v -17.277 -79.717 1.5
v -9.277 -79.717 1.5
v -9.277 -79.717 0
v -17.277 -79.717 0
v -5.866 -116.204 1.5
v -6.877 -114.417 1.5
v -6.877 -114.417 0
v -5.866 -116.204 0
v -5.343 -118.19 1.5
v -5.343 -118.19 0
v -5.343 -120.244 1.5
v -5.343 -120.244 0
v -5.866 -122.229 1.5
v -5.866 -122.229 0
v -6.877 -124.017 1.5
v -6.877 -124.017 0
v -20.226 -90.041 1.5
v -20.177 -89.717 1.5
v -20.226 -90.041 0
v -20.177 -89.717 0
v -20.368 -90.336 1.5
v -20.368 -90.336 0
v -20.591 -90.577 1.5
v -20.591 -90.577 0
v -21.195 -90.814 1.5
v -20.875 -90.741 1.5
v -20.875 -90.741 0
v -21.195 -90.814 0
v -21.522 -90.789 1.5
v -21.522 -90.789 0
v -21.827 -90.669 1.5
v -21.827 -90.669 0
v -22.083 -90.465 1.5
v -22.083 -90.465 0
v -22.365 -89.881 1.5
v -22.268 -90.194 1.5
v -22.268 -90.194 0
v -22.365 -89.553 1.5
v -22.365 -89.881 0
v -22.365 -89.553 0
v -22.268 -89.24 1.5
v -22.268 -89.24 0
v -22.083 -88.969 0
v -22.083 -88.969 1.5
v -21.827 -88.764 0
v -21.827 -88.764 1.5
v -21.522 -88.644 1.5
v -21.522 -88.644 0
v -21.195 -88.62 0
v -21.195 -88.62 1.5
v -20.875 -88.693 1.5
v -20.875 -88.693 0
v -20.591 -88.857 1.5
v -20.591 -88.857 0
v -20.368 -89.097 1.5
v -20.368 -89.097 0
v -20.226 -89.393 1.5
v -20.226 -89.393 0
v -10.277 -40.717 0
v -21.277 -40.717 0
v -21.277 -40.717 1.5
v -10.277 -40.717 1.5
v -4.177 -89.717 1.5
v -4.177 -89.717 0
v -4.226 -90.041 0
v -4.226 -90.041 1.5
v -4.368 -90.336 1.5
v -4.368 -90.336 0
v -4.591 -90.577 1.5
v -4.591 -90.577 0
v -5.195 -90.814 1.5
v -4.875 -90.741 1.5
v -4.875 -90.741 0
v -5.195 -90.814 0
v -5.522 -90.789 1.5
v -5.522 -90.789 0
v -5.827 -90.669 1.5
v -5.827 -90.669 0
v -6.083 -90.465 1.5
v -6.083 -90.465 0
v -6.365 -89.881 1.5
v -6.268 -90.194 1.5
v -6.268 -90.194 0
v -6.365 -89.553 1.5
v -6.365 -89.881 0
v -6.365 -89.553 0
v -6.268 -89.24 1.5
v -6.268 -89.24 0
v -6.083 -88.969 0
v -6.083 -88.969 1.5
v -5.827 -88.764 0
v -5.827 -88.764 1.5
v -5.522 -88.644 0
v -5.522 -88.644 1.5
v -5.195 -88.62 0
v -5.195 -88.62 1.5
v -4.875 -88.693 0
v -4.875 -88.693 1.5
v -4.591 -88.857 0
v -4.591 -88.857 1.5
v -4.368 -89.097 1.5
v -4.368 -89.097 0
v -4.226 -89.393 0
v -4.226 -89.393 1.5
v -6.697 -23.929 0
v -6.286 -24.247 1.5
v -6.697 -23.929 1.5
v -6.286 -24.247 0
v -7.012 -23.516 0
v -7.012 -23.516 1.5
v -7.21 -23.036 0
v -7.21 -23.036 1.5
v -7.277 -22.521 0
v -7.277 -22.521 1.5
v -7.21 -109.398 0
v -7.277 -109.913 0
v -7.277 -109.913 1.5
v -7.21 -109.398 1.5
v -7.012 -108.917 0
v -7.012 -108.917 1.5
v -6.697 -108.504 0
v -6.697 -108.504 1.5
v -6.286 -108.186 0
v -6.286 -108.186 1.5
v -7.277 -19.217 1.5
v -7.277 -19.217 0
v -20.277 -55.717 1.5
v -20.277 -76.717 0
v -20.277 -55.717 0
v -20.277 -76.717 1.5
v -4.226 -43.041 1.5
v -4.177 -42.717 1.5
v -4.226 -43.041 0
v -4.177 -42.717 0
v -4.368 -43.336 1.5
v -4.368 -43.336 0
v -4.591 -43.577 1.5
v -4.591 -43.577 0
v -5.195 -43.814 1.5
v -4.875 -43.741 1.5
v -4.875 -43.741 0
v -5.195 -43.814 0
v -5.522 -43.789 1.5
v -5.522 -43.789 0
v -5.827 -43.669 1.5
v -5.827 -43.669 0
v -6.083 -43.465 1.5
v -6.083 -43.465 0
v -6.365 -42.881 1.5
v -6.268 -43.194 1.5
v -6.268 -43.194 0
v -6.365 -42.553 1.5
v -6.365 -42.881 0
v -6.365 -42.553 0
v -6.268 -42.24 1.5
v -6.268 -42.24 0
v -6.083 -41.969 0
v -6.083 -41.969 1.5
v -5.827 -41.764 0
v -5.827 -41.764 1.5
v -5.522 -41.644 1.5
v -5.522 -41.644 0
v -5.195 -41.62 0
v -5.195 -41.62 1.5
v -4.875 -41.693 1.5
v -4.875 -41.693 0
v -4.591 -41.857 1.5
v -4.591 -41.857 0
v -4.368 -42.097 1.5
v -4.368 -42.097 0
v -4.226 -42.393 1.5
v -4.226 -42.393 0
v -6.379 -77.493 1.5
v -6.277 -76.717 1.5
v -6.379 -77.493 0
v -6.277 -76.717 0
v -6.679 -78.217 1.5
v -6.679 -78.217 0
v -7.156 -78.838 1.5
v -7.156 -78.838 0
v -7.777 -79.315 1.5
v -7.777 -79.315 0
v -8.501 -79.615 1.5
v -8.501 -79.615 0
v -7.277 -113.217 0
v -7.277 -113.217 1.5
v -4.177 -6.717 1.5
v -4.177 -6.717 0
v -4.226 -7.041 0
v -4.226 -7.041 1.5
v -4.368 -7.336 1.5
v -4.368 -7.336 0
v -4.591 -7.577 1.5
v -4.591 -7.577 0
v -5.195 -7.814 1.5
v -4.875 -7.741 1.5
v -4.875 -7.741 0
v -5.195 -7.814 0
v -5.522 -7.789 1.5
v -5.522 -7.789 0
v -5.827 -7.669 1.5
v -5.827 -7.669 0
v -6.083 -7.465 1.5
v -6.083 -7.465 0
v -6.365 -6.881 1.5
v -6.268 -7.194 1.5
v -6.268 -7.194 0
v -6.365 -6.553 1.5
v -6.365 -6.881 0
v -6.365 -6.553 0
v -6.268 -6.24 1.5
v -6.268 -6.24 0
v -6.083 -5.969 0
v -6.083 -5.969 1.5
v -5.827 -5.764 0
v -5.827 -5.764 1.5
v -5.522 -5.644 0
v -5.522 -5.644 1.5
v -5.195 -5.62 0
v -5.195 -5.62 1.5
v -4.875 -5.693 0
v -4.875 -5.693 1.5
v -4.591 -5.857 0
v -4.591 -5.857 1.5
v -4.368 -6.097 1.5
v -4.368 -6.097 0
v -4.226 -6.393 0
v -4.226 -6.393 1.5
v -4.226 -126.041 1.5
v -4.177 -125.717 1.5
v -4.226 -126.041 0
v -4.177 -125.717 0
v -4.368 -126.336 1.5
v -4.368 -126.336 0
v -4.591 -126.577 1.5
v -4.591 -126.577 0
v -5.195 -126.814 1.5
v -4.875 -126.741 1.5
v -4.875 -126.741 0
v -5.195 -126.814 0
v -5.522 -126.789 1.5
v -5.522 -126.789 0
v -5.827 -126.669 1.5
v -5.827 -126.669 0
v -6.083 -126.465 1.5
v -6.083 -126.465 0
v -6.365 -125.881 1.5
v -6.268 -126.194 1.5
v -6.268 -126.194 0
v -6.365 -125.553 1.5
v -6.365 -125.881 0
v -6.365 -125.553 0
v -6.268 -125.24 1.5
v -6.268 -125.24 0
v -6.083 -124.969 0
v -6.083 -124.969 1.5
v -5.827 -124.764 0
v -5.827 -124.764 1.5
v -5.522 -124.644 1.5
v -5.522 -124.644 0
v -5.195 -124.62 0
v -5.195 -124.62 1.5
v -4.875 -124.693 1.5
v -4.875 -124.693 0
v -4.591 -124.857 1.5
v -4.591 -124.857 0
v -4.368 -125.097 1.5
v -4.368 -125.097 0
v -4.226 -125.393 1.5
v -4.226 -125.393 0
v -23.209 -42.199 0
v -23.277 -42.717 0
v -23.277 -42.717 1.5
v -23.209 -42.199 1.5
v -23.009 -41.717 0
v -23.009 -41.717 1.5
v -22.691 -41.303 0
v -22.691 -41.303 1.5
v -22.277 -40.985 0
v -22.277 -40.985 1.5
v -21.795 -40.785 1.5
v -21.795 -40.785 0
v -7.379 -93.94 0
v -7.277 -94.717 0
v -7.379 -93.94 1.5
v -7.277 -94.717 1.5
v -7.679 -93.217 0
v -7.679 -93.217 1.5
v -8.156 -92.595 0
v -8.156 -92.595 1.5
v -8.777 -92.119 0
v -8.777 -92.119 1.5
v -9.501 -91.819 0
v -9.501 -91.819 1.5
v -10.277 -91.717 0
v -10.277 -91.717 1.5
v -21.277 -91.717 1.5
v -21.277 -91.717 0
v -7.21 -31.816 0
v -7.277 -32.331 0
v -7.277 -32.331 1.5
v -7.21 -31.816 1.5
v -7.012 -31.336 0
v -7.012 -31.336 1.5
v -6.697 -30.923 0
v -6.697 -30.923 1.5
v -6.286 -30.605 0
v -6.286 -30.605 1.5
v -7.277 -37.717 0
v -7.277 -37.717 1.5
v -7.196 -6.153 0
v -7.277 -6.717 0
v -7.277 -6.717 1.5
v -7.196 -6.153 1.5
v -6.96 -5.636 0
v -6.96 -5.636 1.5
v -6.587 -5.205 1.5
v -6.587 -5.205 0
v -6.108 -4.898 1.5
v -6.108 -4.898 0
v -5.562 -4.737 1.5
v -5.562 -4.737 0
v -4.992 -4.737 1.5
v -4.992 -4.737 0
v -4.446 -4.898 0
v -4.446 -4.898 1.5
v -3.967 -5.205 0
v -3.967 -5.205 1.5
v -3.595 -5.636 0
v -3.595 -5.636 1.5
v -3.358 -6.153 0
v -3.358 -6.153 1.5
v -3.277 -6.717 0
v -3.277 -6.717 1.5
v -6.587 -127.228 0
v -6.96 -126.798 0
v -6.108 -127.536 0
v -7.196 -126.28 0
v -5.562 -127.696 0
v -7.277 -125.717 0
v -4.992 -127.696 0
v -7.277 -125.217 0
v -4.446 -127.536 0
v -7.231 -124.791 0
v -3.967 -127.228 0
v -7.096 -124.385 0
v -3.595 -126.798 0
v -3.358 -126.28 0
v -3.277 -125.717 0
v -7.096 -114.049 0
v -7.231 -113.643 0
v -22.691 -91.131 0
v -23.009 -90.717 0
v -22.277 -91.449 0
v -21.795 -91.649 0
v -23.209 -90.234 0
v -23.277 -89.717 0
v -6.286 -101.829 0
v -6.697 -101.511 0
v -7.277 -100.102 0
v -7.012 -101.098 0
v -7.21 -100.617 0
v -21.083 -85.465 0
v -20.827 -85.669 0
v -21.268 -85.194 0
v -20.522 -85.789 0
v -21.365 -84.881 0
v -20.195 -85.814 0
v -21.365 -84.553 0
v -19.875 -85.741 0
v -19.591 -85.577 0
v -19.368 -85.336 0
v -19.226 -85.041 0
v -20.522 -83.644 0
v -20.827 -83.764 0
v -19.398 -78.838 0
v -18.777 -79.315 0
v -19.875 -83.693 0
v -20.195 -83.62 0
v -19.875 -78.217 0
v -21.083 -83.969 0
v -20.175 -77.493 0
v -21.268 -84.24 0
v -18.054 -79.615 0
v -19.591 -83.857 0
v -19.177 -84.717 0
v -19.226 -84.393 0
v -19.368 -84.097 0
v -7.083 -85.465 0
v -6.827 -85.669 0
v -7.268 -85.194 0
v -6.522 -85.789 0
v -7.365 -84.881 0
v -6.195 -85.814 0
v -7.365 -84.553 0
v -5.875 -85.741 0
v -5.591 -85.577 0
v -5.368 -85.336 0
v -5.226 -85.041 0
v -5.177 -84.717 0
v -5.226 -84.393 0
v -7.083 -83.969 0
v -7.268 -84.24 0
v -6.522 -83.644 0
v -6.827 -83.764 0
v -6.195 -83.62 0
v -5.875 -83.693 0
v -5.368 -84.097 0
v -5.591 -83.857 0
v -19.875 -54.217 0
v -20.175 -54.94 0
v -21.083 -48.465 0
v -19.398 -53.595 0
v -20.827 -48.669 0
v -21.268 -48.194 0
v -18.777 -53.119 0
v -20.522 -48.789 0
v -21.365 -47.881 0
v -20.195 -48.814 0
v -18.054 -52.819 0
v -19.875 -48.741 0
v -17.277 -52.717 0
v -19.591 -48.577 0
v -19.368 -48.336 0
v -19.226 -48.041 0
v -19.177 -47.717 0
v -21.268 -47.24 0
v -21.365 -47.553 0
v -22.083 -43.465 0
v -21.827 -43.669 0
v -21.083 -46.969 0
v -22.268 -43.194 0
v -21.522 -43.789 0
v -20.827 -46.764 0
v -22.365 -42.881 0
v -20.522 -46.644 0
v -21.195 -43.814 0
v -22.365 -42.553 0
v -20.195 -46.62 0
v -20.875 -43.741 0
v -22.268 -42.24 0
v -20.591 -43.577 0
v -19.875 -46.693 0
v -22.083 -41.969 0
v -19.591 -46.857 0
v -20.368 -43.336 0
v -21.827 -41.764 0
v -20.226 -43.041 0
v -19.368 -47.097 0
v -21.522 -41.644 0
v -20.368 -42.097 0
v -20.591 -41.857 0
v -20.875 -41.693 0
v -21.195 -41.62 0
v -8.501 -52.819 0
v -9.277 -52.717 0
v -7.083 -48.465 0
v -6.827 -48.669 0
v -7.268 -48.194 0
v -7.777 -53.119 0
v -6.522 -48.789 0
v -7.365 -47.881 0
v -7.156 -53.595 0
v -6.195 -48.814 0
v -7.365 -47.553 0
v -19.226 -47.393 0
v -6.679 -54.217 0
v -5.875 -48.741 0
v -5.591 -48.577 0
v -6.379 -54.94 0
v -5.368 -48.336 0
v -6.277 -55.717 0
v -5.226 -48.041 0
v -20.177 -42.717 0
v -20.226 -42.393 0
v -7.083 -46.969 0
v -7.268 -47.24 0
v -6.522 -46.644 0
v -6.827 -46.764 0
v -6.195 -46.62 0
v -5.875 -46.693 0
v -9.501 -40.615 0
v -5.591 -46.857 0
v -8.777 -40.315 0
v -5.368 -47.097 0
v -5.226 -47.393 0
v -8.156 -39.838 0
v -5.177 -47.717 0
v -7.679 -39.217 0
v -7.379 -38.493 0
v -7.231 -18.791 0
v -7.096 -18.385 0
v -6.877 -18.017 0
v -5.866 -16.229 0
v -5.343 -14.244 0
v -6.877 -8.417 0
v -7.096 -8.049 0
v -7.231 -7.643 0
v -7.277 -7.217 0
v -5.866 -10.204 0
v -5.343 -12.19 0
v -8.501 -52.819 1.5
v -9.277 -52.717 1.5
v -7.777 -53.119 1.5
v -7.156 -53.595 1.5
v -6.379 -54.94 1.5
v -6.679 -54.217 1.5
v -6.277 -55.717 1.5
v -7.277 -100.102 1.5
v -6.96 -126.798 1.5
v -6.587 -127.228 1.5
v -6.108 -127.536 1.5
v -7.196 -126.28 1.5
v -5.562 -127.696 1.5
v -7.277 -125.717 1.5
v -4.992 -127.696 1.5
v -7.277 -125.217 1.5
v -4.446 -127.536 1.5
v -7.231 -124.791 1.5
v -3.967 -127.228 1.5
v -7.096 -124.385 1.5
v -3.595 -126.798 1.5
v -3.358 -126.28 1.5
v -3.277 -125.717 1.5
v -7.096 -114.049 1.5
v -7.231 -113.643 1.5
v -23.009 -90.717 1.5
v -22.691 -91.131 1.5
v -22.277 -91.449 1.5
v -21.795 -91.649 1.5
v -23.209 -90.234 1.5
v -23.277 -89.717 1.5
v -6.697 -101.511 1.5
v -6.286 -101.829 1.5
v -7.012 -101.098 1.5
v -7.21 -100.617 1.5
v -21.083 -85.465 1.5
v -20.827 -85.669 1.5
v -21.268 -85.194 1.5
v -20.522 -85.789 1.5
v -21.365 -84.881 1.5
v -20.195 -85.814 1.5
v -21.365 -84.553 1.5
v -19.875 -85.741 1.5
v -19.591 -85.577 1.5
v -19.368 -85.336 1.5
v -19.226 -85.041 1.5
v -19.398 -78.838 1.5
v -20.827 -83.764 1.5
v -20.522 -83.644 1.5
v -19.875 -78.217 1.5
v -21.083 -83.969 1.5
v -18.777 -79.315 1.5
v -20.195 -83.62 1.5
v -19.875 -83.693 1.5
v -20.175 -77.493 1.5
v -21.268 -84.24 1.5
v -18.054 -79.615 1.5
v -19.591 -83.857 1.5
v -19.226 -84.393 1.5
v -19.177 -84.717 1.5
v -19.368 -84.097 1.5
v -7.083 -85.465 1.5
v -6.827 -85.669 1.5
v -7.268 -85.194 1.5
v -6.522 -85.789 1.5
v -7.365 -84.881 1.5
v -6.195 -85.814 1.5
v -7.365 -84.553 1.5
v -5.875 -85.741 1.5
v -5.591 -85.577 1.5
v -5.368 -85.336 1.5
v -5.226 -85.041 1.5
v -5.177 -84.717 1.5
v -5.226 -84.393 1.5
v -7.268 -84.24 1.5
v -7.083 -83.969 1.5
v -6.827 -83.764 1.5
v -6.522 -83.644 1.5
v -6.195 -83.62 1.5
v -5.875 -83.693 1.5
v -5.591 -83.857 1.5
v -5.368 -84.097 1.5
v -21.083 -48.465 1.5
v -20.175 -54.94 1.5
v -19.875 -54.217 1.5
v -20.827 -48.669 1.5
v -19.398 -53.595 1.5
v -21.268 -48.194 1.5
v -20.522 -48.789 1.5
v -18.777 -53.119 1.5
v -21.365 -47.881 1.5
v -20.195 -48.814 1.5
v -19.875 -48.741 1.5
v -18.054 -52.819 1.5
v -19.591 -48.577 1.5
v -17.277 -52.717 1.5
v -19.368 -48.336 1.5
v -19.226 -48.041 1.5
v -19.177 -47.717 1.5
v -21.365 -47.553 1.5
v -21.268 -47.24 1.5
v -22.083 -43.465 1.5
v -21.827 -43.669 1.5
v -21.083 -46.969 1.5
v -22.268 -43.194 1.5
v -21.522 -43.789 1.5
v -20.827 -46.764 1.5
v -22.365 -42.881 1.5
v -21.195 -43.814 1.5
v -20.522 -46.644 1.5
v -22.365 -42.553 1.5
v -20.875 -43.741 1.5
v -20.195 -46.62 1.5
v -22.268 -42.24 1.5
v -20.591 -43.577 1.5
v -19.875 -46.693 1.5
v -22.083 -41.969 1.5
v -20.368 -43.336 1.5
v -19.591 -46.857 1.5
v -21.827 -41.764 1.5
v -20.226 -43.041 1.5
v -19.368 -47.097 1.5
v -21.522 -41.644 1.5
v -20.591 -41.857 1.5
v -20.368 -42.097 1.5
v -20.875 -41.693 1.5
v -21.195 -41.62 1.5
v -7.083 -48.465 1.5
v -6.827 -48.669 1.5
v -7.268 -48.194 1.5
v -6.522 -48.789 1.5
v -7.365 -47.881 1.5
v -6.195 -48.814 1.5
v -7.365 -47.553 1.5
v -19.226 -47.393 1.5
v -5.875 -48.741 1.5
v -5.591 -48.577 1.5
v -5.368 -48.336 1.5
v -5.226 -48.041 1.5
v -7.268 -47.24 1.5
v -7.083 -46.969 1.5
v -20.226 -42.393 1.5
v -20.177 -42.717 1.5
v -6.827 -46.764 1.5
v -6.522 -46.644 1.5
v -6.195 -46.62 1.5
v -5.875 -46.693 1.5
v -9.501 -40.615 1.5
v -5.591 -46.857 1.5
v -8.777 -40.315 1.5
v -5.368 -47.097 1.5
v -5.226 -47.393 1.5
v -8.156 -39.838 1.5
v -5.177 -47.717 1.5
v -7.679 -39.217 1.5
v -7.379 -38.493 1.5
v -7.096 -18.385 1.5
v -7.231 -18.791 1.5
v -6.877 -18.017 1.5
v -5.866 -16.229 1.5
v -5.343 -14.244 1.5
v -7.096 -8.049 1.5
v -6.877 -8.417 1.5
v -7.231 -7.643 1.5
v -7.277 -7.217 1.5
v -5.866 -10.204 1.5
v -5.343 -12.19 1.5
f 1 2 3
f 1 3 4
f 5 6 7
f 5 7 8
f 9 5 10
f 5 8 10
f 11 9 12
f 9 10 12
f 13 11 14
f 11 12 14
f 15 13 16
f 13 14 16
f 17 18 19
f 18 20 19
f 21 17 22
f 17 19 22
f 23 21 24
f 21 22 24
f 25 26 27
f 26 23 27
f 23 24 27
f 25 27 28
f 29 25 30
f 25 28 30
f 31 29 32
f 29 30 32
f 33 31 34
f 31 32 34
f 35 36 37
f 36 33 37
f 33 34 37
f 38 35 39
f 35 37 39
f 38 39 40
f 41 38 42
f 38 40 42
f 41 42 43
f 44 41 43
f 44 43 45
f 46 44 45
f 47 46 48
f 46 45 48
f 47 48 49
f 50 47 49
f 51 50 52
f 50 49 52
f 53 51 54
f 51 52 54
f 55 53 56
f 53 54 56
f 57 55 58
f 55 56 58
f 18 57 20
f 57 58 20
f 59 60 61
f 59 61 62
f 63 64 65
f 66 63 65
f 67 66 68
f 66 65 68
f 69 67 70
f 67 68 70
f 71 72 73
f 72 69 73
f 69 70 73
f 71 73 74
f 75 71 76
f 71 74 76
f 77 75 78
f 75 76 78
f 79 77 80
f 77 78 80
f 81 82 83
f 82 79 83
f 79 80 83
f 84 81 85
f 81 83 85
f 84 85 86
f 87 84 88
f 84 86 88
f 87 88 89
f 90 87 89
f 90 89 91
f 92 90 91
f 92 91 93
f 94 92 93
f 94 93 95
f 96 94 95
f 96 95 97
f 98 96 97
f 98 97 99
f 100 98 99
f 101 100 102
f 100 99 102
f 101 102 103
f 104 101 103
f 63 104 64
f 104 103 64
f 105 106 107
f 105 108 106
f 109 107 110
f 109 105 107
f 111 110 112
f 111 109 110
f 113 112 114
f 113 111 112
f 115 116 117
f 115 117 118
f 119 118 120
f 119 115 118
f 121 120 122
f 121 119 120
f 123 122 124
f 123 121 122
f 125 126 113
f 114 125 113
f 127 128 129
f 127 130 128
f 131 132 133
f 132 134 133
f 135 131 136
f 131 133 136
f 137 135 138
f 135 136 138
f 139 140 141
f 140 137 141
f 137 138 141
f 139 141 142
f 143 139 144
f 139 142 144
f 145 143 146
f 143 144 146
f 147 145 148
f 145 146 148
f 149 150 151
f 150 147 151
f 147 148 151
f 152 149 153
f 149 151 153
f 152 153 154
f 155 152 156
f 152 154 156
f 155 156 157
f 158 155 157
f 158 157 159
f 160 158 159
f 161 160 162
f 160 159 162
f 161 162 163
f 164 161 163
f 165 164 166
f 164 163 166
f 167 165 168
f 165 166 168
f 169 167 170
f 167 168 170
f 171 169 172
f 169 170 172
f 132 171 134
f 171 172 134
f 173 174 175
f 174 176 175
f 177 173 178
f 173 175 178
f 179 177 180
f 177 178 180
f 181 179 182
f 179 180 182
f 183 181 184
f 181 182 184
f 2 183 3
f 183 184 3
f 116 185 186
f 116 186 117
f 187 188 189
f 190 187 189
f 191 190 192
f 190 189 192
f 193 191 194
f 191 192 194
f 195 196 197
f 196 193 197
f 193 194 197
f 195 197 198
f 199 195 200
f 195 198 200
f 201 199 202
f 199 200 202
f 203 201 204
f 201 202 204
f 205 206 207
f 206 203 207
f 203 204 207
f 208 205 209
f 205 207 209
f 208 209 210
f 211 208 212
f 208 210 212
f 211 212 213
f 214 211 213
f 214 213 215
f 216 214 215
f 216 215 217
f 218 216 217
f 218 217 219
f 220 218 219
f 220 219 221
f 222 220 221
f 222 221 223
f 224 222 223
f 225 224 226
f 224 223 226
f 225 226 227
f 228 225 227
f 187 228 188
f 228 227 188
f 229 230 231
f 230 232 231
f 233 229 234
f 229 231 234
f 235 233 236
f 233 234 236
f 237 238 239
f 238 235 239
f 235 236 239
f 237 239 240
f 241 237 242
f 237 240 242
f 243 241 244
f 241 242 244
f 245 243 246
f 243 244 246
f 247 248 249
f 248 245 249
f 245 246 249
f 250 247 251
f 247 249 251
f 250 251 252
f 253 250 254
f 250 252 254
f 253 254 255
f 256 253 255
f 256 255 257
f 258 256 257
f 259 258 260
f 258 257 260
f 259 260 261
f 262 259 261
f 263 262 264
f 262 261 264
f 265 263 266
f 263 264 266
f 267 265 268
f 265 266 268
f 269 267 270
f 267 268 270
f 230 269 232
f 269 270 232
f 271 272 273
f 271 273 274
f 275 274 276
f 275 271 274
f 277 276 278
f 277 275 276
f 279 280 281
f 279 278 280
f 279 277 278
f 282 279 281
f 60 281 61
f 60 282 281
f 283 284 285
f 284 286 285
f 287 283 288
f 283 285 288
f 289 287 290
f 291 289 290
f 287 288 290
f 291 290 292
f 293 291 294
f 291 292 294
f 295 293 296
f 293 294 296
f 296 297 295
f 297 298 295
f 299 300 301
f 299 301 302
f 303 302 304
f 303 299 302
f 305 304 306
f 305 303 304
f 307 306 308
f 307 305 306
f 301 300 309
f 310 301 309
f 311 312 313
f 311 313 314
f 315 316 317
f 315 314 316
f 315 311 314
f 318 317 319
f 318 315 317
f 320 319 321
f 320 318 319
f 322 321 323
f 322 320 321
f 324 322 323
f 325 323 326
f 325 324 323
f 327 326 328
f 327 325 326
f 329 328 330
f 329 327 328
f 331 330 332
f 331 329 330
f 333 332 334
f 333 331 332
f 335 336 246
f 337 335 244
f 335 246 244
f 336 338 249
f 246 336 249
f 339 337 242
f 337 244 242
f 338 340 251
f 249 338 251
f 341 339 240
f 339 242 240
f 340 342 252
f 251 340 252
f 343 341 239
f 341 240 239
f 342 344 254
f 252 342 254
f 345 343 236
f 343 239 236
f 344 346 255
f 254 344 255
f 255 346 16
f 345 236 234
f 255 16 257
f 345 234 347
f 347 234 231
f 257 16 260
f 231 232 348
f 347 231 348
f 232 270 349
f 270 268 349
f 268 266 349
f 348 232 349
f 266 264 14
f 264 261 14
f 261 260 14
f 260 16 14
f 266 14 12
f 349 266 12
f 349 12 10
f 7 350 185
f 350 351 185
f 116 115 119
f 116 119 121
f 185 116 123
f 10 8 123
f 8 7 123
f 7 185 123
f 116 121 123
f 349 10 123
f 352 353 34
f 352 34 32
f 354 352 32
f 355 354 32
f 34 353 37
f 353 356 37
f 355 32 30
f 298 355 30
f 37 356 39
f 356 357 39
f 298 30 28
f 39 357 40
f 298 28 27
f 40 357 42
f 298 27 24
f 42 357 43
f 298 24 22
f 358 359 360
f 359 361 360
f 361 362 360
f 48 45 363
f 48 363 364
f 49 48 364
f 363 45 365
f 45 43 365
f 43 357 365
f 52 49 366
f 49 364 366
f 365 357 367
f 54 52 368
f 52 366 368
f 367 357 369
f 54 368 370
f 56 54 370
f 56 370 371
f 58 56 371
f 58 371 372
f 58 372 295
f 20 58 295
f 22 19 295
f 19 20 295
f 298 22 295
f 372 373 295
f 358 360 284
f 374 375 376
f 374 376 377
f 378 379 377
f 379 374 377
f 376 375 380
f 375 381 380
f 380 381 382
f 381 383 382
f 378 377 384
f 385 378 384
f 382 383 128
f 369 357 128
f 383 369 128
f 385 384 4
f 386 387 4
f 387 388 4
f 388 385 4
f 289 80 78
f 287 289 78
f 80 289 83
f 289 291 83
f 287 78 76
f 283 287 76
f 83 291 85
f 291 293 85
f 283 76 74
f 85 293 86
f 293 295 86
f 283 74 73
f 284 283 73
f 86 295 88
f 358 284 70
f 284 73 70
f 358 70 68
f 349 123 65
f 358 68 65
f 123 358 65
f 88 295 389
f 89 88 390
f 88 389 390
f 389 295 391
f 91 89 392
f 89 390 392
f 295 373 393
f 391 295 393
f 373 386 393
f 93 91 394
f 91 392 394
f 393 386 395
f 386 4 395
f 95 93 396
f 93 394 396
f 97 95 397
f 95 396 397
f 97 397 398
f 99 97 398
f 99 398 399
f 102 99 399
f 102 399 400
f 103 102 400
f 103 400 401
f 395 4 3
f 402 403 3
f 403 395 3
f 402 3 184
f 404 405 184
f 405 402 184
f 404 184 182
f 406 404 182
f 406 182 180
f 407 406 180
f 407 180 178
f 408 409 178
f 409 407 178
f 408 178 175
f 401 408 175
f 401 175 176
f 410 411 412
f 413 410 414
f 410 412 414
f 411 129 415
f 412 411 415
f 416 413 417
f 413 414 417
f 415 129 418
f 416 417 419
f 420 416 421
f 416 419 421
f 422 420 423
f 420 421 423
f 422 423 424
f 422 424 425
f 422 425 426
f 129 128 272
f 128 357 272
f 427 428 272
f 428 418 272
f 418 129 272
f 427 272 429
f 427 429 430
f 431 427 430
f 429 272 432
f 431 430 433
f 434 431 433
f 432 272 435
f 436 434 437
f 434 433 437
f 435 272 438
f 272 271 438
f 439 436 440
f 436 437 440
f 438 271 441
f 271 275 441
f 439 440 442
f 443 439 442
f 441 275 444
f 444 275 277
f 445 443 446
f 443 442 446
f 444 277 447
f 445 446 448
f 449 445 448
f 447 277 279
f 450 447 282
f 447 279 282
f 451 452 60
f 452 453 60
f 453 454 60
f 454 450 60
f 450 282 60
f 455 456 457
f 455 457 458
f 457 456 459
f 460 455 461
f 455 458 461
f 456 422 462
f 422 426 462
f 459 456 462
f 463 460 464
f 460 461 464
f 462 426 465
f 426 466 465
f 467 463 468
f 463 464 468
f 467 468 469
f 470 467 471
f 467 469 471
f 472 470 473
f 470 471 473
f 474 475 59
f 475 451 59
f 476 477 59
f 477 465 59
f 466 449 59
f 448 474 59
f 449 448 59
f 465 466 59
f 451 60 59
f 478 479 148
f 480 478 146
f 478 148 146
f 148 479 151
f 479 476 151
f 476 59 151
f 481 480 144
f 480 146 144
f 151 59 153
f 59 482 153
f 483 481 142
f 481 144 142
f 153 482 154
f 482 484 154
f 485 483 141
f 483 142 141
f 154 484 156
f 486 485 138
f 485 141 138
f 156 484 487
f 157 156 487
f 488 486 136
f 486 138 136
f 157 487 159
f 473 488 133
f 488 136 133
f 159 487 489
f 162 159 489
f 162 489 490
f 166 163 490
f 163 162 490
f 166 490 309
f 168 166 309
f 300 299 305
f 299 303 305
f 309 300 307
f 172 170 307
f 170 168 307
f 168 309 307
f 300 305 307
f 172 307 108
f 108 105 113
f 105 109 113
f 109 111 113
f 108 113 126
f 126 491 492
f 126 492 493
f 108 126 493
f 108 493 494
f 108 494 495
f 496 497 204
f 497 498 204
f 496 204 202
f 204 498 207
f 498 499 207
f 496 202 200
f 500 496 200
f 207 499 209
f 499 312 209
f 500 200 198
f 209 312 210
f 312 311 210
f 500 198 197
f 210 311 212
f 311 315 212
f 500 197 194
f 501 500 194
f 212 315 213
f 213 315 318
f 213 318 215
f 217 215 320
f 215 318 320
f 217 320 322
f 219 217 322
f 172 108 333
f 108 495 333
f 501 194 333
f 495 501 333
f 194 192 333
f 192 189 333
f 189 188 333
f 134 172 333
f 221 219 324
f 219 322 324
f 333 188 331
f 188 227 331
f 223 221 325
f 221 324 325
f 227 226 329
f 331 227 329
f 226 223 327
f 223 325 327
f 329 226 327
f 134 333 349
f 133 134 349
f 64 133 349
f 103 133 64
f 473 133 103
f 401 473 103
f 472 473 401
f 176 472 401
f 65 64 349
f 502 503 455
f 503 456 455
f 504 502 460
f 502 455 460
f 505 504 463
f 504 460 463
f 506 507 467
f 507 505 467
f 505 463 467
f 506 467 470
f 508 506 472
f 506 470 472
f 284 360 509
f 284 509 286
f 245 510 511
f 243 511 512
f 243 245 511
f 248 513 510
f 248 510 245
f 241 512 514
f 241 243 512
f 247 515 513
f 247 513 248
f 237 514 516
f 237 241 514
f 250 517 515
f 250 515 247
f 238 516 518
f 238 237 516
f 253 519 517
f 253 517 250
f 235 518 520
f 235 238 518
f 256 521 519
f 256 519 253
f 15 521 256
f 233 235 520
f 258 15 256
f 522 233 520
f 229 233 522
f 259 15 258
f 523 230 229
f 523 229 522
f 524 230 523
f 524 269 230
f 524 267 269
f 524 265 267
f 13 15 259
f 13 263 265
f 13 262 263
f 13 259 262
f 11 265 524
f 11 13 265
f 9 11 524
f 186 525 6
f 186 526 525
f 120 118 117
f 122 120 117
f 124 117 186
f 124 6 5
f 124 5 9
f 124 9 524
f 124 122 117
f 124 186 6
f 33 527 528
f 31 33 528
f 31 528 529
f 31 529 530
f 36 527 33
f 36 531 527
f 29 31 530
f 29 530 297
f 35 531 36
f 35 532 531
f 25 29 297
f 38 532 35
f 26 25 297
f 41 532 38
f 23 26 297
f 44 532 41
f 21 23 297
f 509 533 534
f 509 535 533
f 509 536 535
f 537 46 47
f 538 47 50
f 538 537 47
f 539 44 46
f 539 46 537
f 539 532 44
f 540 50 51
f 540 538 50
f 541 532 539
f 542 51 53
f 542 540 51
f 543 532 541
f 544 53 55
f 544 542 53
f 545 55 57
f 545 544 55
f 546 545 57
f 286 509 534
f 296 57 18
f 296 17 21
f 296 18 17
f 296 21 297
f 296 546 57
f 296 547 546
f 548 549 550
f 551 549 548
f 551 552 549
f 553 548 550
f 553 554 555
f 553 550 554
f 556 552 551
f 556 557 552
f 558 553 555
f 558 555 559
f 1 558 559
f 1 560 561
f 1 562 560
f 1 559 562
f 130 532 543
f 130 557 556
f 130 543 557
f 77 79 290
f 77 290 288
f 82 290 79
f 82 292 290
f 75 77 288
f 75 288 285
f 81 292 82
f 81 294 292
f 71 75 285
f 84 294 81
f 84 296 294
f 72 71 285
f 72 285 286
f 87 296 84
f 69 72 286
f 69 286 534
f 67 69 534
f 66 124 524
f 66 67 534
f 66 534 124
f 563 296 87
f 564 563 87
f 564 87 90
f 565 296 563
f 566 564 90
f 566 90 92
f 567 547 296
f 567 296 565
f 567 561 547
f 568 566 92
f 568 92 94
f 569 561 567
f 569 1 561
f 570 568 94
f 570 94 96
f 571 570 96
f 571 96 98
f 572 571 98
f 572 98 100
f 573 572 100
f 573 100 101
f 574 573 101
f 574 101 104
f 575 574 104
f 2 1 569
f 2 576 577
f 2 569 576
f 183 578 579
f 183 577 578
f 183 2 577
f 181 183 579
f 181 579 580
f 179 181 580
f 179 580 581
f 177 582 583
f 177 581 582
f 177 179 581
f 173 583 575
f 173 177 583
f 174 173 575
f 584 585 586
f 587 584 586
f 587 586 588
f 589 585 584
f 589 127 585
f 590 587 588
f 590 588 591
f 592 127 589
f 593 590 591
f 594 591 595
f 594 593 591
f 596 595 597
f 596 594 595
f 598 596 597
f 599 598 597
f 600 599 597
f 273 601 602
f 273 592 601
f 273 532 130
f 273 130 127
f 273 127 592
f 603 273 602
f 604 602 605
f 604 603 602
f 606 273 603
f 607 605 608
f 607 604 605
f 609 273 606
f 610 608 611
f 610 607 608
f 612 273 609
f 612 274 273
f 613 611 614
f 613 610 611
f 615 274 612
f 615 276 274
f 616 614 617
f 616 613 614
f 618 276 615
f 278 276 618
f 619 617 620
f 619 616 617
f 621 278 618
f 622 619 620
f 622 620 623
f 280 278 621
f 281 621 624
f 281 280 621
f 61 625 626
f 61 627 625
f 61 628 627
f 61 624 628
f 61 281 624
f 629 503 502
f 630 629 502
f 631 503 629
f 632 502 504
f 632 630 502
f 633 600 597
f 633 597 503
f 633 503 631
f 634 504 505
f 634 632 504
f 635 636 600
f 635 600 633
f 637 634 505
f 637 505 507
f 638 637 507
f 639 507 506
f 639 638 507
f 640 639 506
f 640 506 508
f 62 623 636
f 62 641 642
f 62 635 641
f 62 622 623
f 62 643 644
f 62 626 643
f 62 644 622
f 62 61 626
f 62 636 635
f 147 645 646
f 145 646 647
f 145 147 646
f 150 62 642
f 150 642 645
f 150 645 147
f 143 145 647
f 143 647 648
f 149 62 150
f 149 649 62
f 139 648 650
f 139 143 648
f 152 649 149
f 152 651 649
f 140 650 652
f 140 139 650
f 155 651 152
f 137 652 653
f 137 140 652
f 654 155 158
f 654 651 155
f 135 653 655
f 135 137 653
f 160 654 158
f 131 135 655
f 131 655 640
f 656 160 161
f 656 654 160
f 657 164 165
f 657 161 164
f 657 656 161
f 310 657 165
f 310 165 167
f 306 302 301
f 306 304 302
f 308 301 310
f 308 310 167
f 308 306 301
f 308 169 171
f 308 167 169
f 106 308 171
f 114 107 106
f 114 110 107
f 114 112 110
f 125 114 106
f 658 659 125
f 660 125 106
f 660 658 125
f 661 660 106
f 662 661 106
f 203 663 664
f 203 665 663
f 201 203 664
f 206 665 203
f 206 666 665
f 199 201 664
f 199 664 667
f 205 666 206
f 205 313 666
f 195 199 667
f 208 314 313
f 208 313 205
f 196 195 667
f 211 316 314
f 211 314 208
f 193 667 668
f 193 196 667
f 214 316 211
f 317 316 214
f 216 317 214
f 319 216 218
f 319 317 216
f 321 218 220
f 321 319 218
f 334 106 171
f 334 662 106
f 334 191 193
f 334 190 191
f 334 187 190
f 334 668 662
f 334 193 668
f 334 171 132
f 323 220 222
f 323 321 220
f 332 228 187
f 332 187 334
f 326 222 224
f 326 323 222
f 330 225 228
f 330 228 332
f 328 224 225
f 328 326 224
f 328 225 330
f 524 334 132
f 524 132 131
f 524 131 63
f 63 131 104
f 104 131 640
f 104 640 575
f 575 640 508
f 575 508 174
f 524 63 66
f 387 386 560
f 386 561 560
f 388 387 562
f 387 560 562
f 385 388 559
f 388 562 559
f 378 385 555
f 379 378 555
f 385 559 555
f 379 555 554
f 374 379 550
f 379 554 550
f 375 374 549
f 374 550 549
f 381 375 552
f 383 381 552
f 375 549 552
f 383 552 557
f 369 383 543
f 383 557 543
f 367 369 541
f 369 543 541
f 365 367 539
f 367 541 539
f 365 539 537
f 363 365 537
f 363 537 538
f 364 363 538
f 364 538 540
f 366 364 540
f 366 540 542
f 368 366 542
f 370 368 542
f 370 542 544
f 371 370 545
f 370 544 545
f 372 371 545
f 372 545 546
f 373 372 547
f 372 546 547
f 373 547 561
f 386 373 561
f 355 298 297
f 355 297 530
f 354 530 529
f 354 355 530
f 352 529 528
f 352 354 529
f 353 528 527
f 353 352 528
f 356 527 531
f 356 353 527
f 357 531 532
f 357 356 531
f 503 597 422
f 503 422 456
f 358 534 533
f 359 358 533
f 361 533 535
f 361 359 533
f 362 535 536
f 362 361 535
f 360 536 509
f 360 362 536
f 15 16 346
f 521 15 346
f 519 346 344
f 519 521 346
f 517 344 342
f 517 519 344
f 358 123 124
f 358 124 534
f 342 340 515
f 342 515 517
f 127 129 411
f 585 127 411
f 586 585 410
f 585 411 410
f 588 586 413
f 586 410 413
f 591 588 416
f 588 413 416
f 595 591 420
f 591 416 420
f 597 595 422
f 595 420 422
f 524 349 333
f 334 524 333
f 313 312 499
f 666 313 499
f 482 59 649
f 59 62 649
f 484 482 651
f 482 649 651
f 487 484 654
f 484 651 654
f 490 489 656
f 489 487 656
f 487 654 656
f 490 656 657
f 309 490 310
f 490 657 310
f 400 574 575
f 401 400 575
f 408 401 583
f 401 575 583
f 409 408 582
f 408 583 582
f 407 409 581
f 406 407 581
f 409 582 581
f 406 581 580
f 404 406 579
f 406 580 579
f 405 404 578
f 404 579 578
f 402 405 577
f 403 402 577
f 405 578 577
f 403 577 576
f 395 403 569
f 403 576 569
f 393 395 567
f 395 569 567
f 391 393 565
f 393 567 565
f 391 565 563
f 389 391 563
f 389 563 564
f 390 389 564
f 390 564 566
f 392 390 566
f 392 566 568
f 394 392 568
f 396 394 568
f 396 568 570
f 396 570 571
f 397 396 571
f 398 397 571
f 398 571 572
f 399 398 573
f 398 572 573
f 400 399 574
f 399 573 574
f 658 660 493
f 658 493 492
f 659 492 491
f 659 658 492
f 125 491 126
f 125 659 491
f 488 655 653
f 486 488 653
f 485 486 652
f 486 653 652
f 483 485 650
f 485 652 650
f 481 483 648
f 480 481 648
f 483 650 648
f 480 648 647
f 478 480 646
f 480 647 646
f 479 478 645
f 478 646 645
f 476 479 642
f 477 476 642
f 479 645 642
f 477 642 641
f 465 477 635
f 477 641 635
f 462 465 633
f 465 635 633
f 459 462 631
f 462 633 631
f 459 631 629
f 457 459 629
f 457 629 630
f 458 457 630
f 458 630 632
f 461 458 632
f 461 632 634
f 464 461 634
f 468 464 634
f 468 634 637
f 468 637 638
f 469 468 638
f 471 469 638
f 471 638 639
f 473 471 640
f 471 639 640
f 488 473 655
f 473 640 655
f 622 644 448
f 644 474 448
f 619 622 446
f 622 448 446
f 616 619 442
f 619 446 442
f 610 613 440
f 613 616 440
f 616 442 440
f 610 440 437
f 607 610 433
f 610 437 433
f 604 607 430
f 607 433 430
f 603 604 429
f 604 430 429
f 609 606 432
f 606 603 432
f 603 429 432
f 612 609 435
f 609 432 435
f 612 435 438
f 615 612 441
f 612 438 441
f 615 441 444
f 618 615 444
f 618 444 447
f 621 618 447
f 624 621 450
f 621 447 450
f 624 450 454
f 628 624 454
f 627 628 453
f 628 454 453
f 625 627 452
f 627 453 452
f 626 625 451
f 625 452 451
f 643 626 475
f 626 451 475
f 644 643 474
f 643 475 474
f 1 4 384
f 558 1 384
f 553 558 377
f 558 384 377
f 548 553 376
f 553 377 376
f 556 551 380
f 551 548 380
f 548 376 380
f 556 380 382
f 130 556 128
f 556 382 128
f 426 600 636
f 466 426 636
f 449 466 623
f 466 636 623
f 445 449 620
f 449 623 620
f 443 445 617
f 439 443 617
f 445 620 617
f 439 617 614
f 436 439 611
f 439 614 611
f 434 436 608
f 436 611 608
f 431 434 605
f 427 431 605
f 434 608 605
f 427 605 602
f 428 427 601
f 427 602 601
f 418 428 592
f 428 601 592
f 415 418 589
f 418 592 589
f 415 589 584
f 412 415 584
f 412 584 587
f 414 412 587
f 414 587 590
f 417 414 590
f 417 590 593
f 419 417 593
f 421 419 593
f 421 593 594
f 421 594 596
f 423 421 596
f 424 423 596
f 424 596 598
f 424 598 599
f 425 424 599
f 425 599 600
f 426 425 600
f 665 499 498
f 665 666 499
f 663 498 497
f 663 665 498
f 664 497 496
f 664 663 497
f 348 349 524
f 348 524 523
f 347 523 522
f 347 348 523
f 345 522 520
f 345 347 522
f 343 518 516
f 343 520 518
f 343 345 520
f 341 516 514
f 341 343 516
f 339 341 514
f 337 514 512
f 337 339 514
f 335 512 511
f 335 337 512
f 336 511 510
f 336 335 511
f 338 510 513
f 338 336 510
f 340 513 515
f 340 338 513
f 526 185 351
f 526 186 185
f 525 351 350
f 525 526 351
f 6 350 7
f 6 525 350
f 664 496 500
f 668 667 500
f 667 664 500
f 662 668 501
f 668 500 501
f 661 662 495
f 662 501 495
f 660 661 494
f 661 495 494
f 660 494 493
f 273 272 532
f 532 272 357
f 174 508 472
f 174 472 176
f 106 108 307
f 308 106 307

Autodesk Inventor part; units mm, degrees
ref_plane "YZ Plane" through (0, 0, 0) normal (1, 0, 0) x (0, 1, 0)
ref_plane "XZ Plane" through (0, 0, 0) normal (0, 1, 0) x (-1, 0, 0)
ref_plane "XY Plane" through (0, 0, 0) normal (0, 0, 1) x (1, 0, 0)
sketch "スケッチ1" plane through (0, 0, 0) normal (0, 0, 1) x (1, 0, 0)
  circle A0 centre (-5.2771, -42.7168) radius 0.85 projected
  circle A1 centre (-21.2771, -42.7168) radius 0.85 projected
  circle A2 centre (-5.2771, -6.7168) radius 0.85 projected
  circle A3 centre (-13.2771, -13.2168) radius 8 projected
  line L0 (-3.2771, -4.7168) -> (-7.2771, -4.7168)
  line L1 (-7.2771, -4.7168) -> (-7.2771, -44.7168)
  line L2 (-7.2771, -44.7168) -> (-3.2771, -44.7168)
  line L3 (-3.2771, -44.7168) -> (-3.2771, -4.7168)
  line L4 (-3.2771, -44.7168) -> (-23.2771, -44.7168)
  line L5 (-23.2771, -44.7168) -> (-23.2771, -40.7168)
  line L6 (-23.2771, -40.7168) -> (-3.2771, -40.7168)
  line L7 (-3.2771, -40.7168) -> (-3.2771, -44.7168)
  circle A4 centre (-5.2771, -6.7168) radius 2
  circle A5 centre (-21.2771, -42.7168) radius 2
  circle A6 centre (-5.2771, -6.7168) radius 1.1
  circle A7 centre (-5.2771, -42.7168) radius 1.1
  circle A8 centre (-21.2771, -42.7168) radius 1.1
  line L8 (-5.2771, -66.2168) -> (-21.2771, -66.2168) construction
  circle A9 centre (-5.2771, -89.7168) radius 0.85
  circle A10 centre (-21.2771, -89.7168) radius 0.85
  circle A11 centre (-5.2771, -125.7168) radius 0.85
  circle A12 centre (-13.2771, -119.2168) radius 8
  line L9 (-3.2771, -127.7168) -> (-7.2771, -127.7168)
  line L10 (-7.2771, -127.7168) -> (-7.2771, -87.7168)
  line L11 (-7.2771, -87.7168) -> (-3.2771, -87.7168)
  line L12 (-3.2771, -87.7168) -> (-3.2771, -127.7168)
  line L13 (-3.2771, -87.7168) -> (-23.2771, -87.7168)
  line L14 (-23.2771, -87.7168) -> (-23.2771, -91.7168)
  line L15 (-23.2771, -91.7168) -> (-3.2771, -91.7168)
  line L16 (-3.2771, -91.7168) -> (-3.2771, -87.7168)
  circle A13 centre (-5.2771, -125.7168) radius 2
  circle A14 centre (-21.2771, -89.7168) radius 2
  circle A15 centre (-5.2771, -125.7168) radius 1.1
  circle A16 centre (-5.2771, -89.7168) radius 1.1
  circle A17 centre (-21.2771, -89.7168) radius 1.1
  line L17 (-3.2771, -44.7168) -> (-3.2771, -87.7168)
  line L18 (-23.2771, -44.7168) -> (-23.2771, -87.7168)
  line L19 (-6.4151, -24.526) -> (-6.4151, -30.526)
  line L20 (-6.2865, -24.2474) -> (-6.2865, -30.6046)
  line L21 (-6.2865, -30.6046) -> (-10.1437, -30.6046)
  line L22 (-10.1437, -24.2474) -> (-6.2865, -24.2474)
  line L23 (-6.4151, -107.9075) -> (-6.4151, -101.9075)
  line L24 (-6.2865, -108.1861) -> (-6.2865, -101.8289)
  line L25 (-6.2865, -101.8289) -> (-10.1437, -101.8289)
  line L26 (-10.1437, -108.1861) -> (-6.2865, -108.1861)
  line L27 (7.0429, 25.428) -> (7.0429, 23.728)
  point P0 (0, 0)
  point P1 (-3.2771, -42.7168)
  point P2 (-5.2771, -4.7168)
  point P3 (-13.2771, -44.7168)
  point P4 (-13.2771, -66.2168)
  point P5 (-3.2771, -89.7168)
  point P6 (-5.2771, -127.7168)
  point P7 (-13.2771, -87.7168)
  point P8 (-7.2771, -6.7168)
  point P9 (-7.2771, -7.9253)
  point P10 (-7.2771, -18.5083)
  point P11 (-7.2771, -40.7168)
  point P12 (-21.2771, -40.7168)
  point P13 (-23.2771, -42.7168)
  point P14 (-23.2771, -89.7168)
  point P15 (-21.2771, -91.7168)
  point P16 (-7.2771, -91.7168)
  point P17 (-7.2771, -113.9253)
  point P18 (-7.2771, -124.5083)
  point P19 (-7.2771, -125.7168)
  point P20 (-3.2771, -125.7168)
  point P21 (-3.2771, -6.7168)
  point P22 (-7.2771, -24.2474)
  point P23 (-7.2771, -30.6046)
  point P24 (-7.2771, -101.8289)
  point P25 (-7.2771, -108.1861)
  point P26 (7.0429, 24.578)
  dimension "d0" = 4
  dimension "d1" = 4
  dimension "d2" = 2.2
  dimension "d3" = 2.2
  dimension "d4" = 2.2
  dimension "d11" = 53
extrude "押し出し1" add sketch "スケッチ1" along normal blind 1.5 contours A3 L1 A4 L3 L6 L21 L20 L22 | A4 | L3 L2 L1 L6 | L1 L4 A5 L6 | L17 L11 L13 L18 L4 L2 | A5 | L12 L15 L10 L11 | L4 L5 A5 | L10 L15 A14 L13 | L12 A13 L10 A12 L26 L24 L25 L15 | A14 L14 L13 | A14 | A13
fillet "フィレット1" radius 2 4 edges at (-7.2771, -108.1861, 0.75) (-7.2771, -101.8289, 0.75) (-7.2771, -24.2474, 0.75) (-7.2771, -30.6046, 0.75)
fillet "フィレット2" radius 2 4 edges at (-7.2771, -18.5083, 0.75) (-7.2771, -7.9253, 0.75) (-7.2771, -124.5083, 0.75) (-7.2771, -113.9253, 0.75)
fillet "フィレット3" radius 3 2 edges at (-7.2771, -91.7168, 0.75) (-7.2771, -40.7168, 0.75)
sketch "スケッチ2" plane through (0, 0, 1.5) normal (0, 0, 1) x (1, 0, 0)
  circle A0 centre (-6.2771, -47.7168) radius 1.1
  line L0 (-3.2771, -125.7168) -> (-3.2771, -6.7168) projected
  circle A1 centre (-5.2771, -42.7168) radius 1.1 projected
  circle A2 centre (-20.2771, -47.7168) radius 1.1
  line L1 (-23.2771, -42.7168) -> (-23.2771, -89.7168) projected
  line L2 (-3.2771, -66.2168) -> (-23.2771, -66.2168) construction
  circle A3 centre (-6.2771, -84.7168) radius 1.1
  circle A4 centre (-20.2771, -84.7168) radius 1.1
  line L3 (-20.2771, -52.7168) -> (-6.2771, -52.7168)
  line L4 (-6.2771, -52.7168) -> (-6.2771, -79.7168)
  line L5 (-6.2771, -79.7168) -> (-20.2771, -79.7168)
  line L6 (-20.2771, -79.7168) -> (-20.2771, -52.7168)
  line L7 (-20.2771, -52.7168) -> (-6.2771, -79.7168) construction
  line L8 (-6.2771, -52.7168) -> (-20.2771, -79.7168) construction
  point P0 (0, 0)
  point P1 (-13.2771, -66.2168)
  dimension "d12" = 2.2
  dimension "d13" = 3
  dimension "d14" = 5
  dimension "d15" = 2.2
  dimension "d16" = 3
  dimension "d17" = 5
  dimension "d18" = 3
extrude "押し出し2" cut sketch "スケッチ2" against normal blind 1.5 contours A0 | A2 | A3 | A4 | L3 L4 L5 L6
fillet "フィレット4" radius 3 4 edges at (-20.2771, -52.7168, 0.75) (-6.2771, -52.7168, 0.75) (-20.2771, -79.7168, 0.75) (-6.2771, -79.7168, 0.75)
equation "\"d16\" = d13"
properties part number "new_ude" material "アルミニウム 2014-T4"
